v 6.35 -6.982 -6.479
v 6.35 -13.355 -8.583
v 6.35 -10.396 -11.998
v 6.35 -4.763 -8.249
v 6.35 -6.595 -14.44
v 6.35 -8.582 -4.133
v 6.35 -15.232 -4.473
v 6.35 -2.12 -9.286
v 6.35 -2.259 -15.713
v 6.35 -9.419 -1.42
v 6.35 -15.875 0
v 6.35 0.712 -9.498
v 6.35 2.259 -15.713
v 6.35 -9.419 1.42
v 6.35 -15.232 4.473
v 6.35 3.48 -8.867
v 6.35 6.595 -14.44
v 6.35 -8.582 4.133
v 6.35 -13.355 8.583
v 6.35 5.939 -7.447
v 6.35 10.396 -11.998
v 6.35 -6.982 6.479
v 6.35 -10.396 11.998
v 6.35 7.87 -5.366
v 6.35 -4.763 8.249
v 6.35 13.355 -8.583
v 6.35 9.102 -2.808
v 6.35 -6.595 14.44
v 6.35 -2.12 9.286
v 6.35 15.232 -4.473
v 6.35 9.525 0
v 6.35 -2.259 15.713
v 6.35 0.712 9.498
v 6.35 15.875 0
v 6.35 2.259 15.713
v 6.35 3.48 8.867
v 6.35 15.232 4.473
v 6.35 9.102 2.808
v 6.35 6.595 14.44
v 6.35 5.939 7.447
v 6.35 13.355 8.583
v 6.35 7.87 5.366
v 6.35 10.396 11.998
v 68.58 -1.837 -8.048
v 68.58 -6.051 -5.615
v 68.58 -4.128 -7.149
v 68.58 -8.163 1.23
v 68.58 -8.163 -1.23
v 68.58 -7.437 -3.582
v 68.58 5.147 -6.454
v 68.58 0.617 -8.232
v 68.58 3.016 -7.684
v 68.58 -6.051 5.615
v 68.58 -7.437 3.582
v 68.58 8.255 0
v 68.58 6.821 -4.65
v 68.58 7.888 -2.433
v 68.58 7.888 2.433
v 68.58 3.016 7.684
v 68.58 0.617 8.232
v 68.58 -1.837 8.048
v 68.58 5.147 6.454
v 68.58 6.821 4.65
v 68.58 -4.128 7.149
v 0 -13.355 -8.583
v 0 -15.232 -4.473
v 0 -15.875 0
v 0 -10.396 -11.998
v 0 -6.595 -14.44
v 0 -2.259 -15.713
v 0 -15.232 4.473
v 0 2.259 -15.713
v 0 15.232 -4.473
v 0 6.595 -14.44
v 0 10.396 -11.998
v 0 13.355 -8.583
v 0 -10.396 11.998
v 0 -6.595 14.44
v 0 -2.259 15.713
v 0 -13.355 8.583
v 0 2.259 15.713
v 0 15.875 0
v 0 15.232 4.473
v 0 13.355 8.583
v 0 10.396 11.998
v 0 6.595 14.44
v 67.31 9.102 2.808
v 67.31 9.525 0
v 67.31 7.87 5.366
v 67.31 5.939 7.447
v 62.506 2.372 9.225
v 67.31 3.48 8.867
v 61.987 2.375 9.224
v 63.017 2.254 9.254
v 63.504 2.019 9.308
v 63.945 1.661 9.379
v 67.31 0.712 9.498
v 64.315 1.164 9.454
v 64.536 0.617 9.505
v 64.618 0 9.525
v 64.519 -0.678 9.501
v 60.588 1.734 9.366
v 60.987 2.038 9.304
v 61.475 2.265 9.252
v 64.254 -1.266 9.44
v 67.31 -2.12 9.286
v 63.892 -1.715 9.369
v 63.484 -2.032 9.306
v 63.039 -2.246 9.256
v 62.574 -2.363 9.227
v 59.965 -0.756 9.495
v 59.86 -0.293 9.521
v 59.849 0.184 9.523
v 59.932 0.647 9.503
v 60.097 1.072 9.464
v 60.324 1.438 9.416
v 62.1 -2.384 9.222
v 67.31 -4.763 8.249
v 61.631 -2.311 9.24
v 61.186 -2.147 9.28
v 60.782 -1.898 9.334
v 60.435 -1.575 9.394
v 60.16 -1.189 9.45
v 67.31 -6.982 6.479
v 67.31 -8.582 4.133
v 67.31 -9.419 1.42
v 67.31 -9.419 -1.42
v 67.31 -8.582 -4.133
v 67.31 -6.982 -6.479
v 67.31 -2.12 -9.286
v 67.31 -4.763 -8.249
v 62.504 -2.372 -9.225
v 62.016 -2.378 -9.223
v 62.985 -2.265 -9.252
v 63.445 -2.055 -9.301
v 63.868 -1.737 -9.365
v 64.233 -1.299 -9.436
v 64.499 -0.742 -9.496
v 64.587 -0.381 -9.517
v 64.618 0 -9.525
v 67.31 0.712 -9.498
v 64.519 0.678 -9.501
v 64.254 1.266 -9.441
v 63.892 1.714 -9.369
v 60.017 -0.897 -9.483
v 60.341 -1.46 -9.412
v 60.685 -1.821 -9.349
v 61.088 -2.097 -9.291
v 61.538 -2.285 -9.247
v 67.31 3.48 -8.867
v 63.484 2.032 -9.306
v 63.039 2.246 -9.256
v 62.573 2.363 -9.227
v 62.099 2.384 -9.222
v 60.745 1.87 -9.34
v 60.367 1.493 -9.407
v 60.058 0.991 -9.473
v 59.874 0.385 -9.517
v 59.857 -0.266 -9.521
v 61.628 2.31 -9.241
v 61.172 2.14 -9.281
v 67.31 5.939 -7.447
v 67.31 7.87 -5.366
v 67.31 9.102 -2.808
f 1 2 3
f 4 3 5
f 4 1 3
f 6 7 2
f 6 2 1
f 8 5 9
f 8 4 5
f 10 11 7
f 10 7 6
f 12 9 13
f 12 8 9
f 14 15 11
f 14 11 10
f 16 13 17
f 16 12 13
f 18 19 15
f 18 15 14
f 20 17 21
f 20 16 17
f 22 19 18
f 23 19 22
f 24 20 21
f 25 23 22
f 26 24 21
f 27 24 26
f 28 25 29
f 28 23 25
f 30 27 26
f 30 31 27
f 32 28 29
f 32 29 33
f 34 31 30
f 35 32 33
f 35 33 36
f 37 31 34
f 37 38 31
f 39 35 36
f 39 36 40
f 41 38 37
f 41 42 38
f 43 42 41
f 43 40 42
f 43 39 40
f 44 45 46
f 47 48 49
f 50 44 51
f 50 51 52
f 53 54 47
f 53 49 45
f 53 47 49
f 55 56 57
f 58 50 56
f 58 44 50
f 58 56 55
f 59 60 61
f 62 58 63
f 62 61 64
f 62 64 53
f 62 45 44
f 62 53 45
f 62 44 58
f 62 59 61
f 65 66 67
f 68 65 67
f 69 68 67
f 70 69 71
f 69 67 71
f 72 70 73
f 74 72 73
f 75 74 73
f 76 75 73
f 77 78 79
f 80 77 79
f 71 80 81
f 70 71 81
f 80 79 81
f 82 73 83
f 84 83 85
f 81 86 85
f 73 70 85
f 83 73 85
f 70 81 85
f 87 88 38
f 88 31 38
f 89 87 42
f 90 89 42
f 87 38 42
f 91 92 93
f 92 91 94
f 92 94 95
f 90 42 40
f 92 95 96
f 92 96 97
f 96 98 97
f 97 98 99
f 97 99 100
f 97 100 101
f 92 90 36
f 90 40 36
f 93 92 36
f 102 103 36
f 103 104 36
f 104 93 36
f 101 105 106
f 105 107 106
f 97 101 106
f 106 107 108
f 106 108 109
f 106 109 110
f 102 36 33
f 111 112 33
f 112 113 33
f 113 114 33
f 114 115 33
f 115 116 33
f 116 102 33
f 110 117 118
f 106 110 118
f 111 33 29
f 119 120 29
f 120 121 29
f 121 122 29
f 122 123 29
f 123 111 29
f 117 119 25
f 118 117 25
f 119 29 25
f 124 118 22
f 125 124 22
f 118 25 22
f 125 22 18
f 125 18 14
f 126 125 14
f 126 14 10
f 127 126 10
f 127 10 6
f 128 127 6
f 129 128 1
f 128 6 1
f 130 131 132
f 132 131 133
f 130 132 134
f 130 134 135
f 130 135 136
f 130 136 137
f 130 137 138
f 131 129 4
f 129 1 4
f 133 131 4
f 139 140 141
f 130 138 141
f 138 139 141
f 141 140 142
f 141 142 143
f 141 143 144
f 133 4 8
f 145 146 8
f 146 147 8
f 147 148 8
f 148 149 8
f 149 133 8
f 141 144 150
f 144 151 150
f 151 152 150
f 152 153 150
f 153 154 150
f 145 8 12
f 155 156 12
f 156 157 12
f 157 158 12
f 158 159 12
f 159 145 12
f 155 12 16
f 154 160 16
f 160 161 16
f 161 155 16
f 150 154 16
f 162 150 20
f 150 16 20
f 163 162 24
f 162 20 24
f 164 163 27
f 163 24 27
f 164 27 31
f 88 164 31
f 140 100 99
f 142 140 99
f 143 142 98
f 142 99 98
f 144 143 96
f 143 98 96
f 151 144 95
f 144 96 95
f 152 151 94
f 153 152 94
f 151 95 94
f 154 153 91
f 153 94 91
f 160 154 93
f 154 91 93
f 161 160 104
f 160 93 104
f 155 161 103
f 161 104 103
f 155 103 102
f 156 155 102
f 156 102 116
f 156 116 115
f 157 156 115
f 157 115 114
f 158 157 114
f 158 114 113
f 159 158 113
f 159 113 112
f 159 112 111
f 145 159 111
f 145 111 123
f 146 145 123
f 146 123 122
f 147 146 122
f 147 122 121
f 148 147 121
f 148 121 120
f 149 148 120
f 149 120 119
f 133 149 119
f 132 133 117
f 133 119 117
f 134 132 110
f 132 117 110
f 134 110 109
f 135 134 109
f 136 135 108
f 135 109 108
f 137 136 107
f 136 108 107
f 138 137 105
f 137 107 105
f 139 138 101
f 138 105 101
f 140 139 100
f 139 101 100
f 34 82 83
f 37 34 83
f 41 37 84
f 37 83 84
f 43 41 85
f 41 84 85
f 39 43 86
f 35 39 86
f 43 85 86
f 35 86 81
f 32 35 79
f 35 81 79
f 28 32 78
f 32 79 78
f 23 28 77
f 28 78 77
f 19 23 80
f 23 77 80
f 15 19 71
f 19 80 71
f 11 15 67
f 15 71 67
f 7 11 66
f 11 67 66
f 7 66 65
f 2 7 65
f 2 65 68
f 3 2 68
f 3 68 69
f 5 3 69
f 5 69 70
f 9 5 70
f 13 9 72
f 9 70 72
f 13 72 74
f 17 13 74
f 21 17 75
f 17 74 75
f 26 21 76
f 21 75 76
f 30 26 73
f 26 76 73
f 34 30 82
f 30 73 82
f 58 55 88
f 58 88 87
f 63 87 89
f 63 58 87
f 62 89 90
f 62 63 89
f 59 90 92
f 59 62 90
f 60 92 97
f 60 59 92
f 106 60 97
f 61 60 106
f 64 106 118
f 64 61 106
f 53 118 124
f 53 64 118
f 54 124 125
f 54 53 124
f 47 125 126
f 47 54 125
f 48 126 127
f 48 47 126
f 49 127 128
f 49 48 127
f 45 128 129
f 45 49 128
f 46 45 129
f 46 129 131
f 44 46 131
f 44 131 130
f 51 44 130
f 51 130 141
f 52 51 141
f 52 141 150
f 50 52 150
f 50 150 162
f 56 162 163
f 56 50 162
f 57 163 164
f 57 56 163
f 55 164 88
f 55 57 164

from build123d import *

# Parameters (mm, degrees)
F0_R     = 15.875
F0_R_2   = 9.525
F1_DEPTH = 6.35
F2_DEPTH = 68.58
F3_SIZE2 = 1.27
F3_SIZE  = 1.27
F5_R     = 2.3876
F6_DEPTH = 25.401


with BuildPart() as f1:
    # F0 (on Right) → F1 (new body)
    with BuildSketch(Plane.YZ):
        Circle(F0_R)
        Circle(F0_R_2, mode=Mode.SUBTRACT)
    extrude(amount=F1_DEPTH)

    # F0 (on Right) → F2 (join)
    with BuildSketch(Plane.YZ):
        Circle(F0_R_2)
    extrude(amount=F2_DEPTH)

    # F3
    f3_edges = [f1.edges().sort_by_distance(p)[0] for p in [
        (68.58, -9.525, 0),
    ]]
    chamfer(f3_edges, length=F3_SIZE, length2=F3_SIZE2)

    # F5 (on offset) → F6 (cut, through all)
    with BuildSketch(Plane.XY.offset(9.525)):
        with Locations((62.23, 0)):
            Circle(F5_R)
    extrude(amount=-F6_DEPTH, mode=Mode.SUBTRACT)


solid = f1.part
